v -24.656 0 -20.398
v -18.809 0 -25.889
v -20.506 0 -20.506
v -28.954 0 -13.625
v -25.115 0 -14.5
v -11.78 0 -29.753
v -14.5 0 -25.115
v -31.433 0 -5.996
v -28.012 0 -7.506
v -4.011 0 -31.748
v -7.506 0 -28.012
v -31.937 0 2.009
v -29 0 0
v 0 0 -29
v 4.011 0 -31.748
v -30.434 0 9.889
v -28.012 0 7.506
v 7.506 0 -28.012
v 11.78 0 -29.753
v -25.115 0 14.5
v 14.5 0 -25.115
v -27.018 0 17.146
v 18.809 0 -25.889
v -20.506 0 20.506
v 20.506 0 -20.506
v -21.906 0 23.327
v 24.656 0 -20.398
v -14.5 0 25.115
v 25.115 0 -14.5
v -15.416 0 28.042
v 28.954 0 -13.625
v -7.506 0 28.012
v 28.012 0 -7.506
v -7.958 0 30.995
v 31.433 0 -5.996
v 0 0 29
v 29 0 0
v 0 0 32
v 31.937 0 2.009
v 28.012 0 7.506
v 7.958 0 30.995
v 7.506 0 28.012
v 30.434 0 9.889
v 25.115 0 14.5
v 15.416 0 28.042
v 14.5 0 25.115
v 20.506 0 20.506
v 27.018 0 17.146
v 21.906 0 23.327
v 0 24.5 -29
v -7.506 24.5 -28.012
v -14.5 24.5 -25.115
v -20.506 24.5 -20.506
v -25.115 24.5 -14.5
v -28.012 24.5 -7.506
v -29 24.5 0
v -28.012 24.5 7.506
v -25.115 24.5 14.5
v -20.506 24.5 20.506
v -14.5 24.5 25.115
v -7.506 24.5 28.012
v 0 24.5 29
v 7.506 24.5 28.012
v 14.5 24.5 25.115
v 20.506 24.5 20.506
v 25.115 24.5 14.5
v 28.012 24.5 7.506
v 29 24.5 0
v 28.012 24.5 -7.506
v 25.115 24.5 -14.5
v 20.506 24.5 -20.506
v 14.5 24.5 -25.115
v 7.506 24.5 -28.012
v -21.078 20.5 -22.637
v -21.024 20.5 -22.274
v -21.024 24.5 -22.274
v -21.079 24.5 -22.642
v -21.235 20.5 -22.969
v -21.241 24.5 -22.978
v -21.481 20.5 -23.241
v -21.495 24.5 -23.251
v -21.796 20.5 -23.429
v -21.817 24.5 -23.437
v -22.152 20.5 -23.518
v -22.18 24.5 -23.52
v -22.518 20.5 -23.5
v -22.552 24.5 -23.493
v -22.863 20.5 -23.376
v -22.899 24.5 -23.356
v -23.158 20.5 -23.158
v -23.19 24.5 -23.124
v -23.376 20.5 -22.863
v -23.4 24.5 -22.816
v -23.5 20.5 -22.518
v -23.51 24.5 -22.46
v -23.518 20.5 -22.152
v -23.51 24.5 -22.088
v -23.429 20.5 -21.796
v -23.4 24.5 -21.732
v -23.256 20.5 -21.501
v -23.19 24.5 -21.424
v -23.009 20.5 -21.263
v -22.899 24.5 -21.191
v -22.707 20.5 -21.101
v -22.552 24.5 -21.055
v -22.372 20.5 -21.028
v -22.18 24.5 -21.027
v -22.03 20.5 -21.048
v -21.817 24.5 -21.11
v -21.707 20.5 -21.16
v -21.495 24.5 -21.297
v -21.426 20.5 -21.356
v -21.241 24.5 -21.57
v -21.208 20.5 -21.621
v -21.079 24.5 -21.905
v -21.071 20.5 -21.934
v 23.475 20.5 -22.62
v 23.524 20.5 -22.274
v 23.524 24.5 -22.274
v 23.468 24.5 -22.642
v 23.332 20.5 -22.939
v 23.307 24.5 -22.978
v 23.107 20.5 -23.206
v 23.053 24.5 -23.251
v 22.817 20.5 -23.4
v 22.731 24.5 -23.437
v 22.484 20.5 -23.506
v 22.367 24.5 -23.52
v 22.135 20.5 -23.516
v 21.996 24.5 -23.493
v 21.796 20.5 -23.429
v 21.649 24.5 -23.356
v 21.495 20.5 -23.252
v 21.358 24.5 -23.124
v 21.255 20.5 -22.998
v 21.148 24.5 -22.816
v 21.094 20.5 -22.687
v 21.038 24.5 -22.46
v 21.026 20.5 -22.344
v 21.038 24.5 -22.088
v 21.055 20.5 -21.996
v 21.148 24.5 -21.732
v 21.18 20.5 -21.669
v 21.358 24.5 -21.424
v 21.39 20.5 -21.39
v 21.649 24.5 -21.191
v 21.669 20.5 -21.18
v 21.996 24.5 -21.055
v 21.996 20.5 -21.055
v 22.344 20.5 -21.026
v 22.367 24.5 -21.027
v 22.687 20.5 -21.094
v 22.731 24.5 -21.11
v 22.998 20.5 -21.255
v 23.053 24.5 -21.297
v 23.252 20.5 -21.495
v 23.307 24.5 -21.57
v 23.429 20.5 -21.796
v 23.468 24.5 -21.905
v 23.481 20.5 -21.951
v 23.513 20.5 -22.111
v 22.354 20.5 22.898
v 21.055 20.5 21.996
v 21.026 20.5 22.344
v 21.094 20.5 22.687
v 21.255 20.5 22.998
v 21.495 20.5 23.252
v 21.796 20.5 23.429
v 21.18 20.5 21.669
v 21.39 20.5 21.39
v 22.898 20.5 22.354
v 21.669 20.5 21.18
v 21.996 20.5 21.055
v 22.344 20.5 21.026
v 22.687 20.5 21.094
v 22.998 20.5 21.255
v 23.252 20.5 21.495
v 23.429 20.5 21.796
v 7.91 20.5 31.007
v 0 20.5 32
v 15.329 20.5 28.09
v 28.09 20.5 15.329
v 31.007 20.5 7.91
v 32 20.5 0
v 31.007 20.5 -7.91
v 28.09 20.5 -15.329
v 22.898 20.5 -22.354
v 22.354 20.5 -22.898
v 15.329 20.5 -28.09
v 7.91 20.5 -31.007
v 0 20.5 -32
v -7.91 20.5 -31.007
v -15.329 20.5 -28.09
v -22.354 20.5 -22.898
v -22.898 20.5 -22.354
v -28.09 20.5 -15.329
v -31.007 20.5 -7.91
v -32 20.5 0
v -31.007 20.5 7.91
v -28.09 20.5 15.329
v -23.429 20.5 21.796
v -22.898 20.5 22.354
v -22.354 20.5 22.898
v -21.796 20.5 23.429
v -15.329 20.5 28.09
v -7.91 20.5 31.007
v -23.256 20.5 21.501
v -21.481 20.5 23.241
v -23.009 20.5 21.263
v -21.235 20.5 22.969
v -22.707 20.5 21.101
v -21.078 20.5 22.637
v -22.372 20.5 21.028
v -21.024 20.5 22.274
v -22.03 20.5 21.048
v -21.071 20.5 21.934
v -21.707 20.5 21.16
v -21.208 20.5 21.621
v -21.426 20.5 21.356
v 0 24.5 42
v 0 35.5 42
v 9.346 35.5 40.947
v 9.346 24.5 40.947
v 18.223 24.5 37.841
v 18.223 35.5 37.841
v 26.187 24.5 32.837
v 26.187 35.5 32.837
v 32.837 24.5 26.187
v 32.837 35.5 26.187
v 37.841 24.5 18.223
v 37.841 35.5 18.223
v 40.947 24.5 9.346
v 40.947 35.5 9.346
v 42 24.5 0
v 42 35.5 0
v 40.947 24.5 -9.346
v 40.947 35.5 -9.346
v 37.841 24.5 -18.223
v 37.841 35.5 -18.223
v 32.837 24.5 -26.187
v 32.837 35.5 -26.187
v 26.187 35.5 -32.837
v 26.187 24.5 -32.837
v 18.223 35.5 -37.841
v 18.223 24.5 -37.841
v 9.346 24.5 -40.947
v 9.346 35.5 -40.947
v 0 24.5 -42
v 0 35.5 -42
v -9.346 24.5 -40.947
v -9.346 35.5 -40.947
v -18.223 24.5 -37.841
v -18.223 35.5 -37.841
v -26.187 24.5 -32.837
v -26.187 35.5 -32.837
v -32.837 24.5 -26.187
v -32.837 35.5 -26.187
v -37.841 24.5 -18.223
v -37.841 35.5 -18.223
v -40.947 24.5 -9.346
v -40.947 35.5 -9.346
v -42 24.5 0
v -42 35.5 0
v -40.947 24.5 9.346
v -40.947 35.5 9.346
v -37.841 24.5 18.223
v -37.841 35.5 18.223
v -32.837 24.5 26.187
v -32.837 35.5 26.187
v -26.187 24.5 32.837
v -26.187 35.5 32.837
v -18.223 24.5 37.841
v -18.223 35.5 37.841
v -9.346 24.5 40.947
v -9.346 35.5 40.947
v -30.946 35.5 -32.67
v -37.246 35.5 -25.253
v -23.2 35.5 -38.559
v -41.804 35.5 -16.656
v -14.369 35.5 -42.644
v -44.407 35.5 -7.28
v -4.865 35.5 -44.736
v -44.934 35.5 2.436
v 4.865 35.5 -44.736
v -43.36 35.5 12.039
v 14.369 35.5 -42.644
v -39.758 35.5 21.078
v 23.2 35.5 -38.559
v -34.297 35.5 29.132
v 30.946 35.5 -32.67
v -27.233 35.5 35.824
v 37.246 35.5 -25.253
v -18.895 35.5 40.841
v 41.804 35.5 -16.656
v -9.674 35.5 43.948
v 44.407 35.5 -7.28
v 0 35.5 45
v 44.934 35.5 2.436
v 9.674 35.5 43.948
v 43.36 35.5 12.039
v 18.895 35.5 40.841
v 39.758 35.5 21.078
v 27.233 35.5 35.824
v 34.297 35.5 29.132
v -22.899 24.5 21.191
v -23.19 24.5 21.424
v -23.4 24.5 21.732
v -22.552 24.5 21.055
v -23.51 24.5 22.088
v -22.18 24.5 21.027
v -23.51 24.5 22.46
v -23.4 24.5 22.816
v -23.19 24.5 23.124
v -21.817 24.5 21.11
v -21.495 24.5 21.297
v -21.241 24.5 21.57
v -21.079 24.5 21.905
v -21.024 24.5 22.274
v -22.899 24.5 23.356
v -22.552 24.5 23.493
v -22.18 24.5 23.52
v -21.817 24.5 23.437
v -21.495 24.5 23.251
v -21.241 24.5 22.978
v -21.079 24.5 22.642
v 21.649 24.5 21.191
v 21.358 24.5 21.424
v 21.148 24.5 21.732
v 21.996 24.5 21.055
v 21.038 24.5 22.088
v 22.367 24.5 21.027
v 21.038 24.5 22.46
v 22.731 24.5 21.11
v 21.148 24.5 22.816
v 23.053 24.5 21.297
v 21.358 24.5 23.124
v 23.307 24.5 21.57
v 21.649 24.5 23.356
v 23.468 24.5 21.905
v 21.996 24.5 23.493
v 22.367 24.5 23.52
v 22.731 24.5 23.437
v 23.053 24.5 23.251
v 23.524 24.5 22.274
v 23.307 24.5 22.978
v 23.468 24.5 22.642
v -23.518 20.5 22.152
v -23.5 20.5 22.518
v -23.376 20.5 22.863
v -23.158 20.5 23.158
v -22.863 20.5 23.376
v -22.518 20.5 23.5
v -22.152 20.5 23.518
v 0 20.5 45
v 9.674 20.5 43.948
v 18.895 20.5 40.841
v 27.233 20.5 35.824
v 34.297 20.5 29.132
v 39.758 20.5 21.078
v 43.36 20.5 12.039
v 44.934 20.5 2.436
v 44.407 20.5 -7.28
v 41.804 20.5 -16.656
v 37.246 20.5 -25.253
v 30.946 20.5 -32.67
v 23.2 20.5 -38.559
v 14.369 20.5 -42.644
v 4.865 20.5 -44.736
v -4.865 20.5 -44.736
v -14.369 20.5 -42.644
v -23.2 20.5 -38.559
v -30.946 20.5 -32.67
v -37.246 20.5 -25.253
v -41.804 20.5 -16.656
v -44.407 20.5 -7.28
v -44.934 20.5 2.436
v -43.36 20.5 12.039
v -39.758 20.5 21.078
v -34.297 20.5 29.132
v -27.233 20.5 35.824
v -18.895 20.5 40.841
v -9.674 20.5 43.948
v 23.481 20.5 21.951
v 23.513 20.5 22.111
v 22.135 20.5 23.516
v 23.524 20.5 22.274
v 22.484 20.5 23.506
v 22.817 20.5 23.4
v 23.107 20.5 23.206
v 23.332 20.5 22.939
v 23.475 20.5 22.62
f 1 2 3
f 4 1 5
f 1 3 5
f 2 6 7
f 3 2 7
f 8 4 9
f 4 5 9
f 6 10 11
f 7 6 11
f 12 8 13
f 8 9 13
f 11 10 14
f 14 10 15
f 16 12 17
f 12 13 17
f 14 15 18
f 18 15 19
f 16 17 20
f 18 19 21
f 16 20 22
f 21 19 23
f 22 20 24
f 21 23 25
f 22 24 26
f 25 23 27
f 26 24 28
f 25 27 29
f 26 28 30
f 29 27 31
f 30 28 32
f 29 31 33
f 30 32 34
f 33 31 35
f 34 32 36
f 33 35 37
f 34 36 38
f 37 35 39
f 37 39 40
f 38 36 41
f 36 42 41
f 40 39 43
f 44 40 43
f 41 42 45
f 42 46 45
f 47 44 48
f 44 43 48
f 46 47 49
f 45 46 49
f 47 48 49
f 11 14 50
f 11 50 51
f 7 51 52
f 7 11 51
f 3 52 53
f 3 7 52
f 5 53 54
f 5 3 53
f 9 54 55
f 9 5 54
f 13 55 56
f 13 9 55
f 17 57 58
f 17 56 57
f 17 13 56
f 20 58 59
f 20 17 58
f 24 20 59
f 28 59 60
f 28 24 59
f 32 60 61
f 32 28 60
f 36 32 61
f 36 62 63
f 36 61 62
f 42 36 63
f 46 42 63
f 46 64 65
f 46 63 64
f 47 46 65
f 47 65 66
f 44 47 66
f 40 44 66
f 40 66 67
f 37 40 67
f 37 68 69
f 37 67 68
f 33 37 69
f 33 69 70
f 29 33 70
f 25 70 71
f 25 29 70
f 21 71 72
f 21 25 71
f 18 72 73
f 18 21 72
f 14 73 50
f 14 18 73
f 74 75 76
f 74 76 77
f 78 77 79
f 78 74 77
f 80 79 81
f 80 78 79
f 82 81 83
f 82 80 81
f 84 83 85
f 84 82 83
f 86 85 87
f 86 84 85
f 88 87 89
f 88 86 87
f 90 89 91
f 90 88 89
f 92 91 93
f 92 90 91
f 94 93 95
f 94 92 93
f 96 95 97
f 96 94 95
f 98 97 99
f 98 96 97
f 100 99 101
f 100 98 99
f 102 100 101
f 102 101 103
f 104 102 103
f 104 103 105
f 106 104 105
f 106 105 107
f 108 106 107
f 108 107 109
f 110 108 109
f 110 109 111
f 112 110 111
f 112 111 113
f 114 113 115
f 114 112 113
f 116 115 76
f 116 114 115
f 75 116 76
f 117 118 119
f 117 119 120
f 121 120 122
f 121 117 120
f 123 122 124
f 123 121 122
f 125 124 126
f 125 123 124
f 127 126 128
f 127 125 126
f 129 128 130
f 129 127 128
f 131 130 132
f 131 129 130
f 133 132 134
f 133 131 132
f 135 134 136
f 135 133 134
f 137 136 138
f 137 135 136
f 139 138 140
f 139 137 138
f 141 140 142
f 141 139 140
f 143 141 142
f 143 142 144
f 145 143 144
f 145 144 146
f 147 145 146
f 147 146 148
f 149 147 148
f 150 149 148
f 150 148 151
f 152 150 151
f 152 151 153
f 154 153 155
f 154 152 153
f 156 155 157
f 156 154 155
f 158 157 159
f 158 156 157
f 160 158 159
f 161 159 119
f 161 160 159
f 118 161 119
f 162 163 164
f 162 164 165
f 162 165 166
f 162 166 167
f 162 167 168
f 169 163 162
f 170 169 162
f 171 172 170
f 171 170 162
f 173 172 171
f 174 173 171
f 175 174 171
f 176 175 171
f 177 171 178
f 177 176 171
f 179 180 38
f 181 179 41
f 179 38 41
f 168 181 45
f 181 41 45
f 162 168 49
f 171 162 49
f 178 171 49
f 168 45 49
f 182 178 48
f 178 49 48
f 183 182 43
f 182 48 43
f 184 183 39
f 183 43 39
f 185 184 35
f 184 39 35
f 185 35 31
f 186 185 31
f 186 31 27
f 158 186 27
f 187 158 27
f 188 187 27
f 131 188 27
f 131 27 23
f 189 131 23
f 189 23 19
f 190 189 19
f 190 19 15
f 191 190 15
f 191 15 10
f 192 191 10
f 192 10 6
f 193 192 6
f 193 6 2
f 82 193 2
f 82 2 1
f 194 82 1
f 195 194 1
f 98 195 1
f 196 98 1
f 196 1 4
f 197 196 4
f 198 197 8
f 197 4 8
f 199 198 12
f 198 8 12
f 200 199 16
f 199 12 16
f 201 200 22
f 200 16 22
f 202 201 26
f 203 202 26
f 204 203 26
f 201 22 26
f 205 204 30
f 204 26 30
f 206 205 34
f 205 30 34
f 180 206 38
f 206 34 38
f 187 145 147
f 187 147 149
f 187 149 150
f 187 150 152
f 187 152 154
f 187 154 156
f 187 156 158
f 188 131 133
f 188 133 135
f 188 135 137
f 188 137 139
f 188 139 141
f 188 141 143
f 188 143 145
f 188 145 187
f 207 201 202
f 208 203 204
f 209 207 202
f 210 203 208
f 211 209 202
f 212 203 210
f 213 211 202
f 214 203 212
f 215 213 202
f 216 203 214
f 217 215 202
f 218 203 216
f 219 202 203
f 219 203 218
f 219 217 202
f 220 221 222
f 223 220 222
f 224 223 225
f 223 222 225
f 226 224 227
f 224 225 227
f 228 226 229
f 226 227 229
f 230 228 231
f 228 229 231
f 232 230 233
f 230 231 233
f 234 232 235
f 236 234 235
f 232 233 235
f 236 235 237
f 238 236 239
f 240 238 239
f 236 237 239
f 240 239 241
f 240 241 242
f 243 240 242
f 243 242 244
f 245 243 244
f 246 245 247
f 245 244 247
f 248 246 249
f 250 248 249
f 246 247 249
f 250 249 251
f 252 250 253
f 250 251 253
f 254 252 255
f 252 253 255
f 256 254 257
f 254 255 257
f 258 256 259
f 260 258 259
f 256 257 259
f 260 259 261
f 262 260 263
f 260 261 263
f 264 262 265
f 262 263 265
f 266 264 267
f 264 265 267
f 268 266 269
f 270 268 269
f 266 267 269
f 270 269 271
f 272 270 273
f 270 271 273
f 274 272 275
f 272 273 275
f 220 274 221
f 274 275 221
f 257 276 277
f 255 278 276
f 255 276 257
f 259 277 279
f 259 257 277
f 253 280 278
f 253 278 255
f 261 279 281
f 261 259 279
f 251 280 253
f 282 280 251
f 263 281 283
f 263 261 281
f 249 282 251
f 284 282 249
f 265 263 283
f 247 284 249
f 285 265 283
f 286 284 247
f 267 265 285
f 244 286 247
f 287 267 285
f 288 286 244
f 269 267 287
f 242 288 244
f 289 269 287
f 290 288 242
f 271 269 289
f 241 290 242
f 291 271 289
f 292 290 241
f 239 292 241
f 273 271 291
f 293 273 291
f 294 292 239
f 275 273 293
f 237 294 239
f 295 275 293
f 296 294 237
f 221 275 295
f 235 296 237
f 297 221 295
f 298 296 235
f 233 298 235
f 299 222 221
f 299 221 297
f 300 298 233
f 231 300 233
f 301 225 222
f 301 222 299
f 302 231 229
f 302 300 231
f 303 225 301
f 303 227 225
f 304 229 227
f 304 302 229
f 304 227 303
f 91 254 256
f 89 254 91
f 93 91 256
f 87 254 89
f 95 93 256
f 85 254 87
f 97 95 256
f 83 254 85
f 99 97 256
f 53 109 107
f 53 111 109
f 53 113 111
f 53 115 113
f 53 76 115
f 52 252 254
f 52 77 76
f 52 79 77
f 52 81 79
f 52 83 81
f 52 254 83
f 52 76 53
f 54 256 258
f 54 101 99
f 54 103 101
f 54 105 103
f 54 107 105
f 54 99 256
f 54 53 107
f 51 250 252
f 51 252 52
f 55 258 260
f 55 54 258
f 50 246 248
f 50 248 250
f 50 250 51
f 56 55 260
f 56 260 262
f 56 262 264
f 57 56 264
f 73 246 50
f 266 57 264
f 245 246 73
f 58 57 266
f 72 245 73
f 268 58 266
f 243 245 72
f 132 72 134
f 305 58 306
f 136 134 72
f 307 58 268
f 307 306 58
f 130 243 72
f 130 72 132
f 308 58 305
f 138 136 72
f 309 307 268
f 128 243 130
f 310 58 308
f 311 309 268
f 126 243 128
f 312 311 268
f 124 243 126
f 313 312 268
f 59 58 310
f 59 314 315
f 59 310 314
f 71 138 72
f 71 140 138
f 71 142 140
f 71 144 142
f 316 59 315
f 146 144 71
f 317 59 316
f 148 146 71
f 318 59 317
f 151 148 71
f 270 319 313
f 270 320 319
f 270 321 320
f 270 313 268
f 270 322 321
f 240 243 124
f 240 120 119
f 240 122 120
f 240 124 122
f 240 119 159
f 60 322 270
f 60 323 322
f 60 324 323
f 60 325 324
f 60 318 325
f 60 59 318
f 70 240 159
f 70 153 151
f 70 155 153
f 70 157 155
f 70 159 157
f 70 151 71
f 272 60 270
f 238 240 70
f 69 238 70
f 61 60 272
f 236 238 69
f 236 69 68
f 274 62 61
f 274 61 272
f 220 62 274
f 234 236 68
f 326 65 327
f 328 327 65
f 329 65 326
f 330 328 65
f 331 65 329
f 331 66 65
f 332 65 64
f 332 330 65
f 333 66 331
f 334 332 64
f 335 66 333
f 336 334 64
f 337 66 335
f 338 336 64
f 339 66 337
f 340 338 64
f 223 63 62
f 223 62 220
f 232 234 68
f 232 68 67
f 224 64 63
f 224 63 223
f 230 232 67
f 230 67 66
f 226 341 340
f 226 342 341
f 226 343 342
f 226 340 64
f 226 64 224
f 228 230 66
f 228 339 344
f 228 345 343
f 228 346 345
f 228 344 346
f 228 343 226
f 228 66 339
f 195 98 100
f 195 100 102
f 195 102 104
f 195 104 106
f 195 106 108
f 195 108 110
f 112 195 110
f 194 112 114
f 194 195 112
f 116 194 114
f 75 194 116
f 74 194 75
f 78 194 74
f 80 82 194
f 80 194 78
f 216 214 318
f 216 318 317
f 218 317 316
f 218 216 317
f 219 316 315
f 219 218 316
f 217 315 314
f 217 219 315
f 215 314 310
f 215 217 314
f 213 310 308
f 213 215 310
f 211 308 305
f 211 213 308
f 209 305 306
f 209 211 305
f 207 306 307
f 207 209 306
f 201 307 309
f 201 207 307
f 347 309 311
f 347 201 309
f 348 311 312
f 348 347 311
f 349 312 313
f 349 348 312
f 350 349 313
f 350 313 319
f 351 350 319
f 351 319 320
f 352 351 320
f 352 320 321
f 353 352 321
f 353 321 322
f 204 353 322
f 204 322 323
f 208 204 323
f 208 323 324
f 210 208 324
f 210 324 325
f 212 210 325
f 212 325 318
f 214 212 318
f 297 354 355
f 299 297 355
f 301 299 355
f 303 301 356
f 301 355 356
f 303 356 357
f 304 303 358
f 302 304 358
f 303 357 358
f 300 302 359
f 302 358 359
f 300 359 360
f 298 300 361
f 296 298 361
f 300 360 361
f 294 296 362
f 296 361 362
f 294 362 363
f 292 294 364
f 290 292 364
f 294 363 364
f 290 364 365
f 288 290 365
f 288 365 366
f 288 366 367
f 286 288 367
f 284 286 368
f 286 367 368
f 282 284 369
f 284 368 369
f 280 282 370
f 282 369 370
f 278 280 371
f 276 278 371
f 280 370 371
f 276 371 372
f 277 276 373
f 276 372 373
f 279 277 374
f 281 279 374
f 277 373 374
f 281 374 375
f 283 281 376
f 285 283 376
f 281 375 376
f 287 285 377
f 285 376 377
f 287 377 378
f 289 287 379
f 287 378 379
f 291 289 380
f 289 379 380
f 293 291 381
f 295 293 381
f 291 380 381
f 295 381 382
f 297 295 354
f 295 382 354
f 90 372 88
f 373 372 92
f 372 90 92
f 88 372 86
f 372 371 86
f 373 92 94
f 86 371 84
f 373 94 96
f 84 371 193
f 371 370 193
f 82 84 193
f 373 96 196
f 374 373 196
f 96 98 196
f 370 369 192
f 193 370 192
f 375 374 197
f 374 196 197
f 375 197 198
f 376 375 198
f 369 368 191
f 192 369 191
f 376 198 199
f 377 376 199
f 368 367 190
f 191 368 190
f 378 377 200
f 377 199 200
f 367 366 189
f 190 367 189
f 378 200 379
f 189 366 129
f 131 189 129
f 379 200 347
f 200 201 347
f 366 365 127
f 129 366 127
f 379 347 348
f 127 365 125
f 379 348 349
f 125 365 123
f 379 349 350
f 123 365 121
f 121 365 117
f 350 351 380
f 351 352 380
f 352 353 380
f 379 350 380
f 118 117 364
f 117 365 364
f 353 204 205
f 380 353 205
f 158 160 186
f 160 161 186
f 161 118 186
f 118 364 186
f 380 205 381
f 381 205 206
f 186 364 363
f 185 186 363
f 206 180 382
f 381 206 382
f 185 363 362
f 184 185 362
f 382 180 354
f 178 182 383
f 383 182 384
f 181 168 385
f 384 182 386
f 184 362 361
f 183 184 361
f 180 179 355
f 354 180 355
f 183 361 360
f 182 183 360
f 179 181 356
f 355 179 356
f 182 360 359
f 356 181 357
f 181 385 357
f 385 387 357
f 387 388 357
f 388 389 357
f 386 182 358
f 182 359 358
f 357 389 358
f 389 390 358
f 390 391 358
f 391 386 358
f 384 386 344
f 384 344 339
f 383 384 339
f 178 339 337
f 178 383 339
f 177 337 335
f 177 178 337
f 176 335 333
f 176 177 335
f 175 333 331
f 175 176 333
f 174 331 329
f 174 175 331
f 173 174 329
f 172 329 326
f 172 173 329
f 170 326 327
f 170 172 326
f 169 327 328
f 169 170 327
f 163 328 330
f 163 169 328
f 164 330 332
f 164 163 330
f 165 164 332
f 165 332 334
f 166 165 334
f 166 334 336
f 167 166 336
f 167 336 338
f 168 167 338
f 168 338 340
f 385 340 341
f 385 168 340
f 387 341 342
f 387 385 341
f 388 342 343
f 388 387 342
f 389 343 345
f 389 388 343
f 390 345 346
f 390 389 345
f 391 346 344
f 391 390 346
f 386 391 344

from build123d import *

# Parameters (mm, degrees)
SKETCH_1_R                 = 32
EXTRUDE_1_DEPTH            = 20.5
SKETCH_12_R                = 45
EXTRUDE_2_DEPTH            = 15
SKETCH_11_R                = 29
CUT_EXTRUDE_6_DEPTH        = 35.5
SKETCH_13_R                = 42
CUT_EXTRUDE_7_DEPTH        = 11
HOLE_START                 = 20.5
HOLE_WIZARD_M3_1_OUTLINE_R = 1.25
HOLE_WIZARD_M3_1_DEPTH     = 4


# Read off the part's stored shape, not the designer's step: M3 螺纹孔1
with BuildPart() as part:
    # 草图1 → 凸台-拉伸1 (new body)
    with BuildSketch(Plane(origin=(0, 0, 0), x_dir=(1, 0, 0), z_dir=(0, 1, 0))):
        with Locations(Location((0, 0, 0), (0, 0, 270))):
            Circle(SKETCH_1_R)
    extrude(amount=EXTRUDE_1_DEPTH)

    # 草图12 → 凸台-拉伸2 (add)
    with BuildSketch(Plane(origin=(0, 20.5, 0), x_dir=(1, 0, 0), z_dir=(0, 1, 0))):
        with Locations(Location((0, 0, 0), (0, 0, 270))):
            Circle(SKETCH_12_R)
    extrude(amount=EXTRUDE_2_DEPTH)

    # 草图11 → 切除-拉伸6 (cut)
    with BuildSketch(Plane(origin=(0, 0, 0), x_dir=(1, 0, 0), z_dir=(0, 1, 0))):
        with Locations(Location((0, 0, 0), (0, 0, 90))):
            Circle(SKETCH_11_R)
    extrude(amount=CUT_EXTRUDE_6_DEPTH, mode=Mode.SUBTRACT)

    # 草图13 → 切除-拉伸7 (cut)
    with BuildSketch(Plane(origin=(0, 35.5, 0), x_dir=(1, 0, 0), z_dir=(0, 1, 0))):
        with Locations(Location((0, 0, 0), (0, 0, 270))):
            Circle(SKETCH_13_R)
    extrude(amount=-CUT_EXTRUDE_7_DEPTH, mode=Mode.SUBTRACT)

    # M3 螺纹孔1 outline → M3 螺纹孔1 (cut)
    with BuildSketch(Plane(origin=(0, 0, 0), x_dir=(1, 0, 0), z_dir=(0, 1, 0)).offset(HOLE_START)):
        with Locations((-22.273863607, -22.273863607)):
            Circle(HOLE_WIZARD_M3_1_OUTLINE_R)
        with Locations((22.273863607, -22.273863607)):
            Circle(HOLE_WIZARD_M3_1_OUTLINE_R)
        with Locations((22.273863607, 22.273863607)):
            Circle(HOLE_WIZARD_M3_1_OUTLINE_R)
        with Locations((-22.273863607, 22.273863607)):
            Circle(HOLE_WIZARD_M3_1_OUTLINE_R)
    extrude(amount=HOLE_WIZARD_M3_1_DEPTH, mode=Mode.SUBTRACT)


solid = part.part
